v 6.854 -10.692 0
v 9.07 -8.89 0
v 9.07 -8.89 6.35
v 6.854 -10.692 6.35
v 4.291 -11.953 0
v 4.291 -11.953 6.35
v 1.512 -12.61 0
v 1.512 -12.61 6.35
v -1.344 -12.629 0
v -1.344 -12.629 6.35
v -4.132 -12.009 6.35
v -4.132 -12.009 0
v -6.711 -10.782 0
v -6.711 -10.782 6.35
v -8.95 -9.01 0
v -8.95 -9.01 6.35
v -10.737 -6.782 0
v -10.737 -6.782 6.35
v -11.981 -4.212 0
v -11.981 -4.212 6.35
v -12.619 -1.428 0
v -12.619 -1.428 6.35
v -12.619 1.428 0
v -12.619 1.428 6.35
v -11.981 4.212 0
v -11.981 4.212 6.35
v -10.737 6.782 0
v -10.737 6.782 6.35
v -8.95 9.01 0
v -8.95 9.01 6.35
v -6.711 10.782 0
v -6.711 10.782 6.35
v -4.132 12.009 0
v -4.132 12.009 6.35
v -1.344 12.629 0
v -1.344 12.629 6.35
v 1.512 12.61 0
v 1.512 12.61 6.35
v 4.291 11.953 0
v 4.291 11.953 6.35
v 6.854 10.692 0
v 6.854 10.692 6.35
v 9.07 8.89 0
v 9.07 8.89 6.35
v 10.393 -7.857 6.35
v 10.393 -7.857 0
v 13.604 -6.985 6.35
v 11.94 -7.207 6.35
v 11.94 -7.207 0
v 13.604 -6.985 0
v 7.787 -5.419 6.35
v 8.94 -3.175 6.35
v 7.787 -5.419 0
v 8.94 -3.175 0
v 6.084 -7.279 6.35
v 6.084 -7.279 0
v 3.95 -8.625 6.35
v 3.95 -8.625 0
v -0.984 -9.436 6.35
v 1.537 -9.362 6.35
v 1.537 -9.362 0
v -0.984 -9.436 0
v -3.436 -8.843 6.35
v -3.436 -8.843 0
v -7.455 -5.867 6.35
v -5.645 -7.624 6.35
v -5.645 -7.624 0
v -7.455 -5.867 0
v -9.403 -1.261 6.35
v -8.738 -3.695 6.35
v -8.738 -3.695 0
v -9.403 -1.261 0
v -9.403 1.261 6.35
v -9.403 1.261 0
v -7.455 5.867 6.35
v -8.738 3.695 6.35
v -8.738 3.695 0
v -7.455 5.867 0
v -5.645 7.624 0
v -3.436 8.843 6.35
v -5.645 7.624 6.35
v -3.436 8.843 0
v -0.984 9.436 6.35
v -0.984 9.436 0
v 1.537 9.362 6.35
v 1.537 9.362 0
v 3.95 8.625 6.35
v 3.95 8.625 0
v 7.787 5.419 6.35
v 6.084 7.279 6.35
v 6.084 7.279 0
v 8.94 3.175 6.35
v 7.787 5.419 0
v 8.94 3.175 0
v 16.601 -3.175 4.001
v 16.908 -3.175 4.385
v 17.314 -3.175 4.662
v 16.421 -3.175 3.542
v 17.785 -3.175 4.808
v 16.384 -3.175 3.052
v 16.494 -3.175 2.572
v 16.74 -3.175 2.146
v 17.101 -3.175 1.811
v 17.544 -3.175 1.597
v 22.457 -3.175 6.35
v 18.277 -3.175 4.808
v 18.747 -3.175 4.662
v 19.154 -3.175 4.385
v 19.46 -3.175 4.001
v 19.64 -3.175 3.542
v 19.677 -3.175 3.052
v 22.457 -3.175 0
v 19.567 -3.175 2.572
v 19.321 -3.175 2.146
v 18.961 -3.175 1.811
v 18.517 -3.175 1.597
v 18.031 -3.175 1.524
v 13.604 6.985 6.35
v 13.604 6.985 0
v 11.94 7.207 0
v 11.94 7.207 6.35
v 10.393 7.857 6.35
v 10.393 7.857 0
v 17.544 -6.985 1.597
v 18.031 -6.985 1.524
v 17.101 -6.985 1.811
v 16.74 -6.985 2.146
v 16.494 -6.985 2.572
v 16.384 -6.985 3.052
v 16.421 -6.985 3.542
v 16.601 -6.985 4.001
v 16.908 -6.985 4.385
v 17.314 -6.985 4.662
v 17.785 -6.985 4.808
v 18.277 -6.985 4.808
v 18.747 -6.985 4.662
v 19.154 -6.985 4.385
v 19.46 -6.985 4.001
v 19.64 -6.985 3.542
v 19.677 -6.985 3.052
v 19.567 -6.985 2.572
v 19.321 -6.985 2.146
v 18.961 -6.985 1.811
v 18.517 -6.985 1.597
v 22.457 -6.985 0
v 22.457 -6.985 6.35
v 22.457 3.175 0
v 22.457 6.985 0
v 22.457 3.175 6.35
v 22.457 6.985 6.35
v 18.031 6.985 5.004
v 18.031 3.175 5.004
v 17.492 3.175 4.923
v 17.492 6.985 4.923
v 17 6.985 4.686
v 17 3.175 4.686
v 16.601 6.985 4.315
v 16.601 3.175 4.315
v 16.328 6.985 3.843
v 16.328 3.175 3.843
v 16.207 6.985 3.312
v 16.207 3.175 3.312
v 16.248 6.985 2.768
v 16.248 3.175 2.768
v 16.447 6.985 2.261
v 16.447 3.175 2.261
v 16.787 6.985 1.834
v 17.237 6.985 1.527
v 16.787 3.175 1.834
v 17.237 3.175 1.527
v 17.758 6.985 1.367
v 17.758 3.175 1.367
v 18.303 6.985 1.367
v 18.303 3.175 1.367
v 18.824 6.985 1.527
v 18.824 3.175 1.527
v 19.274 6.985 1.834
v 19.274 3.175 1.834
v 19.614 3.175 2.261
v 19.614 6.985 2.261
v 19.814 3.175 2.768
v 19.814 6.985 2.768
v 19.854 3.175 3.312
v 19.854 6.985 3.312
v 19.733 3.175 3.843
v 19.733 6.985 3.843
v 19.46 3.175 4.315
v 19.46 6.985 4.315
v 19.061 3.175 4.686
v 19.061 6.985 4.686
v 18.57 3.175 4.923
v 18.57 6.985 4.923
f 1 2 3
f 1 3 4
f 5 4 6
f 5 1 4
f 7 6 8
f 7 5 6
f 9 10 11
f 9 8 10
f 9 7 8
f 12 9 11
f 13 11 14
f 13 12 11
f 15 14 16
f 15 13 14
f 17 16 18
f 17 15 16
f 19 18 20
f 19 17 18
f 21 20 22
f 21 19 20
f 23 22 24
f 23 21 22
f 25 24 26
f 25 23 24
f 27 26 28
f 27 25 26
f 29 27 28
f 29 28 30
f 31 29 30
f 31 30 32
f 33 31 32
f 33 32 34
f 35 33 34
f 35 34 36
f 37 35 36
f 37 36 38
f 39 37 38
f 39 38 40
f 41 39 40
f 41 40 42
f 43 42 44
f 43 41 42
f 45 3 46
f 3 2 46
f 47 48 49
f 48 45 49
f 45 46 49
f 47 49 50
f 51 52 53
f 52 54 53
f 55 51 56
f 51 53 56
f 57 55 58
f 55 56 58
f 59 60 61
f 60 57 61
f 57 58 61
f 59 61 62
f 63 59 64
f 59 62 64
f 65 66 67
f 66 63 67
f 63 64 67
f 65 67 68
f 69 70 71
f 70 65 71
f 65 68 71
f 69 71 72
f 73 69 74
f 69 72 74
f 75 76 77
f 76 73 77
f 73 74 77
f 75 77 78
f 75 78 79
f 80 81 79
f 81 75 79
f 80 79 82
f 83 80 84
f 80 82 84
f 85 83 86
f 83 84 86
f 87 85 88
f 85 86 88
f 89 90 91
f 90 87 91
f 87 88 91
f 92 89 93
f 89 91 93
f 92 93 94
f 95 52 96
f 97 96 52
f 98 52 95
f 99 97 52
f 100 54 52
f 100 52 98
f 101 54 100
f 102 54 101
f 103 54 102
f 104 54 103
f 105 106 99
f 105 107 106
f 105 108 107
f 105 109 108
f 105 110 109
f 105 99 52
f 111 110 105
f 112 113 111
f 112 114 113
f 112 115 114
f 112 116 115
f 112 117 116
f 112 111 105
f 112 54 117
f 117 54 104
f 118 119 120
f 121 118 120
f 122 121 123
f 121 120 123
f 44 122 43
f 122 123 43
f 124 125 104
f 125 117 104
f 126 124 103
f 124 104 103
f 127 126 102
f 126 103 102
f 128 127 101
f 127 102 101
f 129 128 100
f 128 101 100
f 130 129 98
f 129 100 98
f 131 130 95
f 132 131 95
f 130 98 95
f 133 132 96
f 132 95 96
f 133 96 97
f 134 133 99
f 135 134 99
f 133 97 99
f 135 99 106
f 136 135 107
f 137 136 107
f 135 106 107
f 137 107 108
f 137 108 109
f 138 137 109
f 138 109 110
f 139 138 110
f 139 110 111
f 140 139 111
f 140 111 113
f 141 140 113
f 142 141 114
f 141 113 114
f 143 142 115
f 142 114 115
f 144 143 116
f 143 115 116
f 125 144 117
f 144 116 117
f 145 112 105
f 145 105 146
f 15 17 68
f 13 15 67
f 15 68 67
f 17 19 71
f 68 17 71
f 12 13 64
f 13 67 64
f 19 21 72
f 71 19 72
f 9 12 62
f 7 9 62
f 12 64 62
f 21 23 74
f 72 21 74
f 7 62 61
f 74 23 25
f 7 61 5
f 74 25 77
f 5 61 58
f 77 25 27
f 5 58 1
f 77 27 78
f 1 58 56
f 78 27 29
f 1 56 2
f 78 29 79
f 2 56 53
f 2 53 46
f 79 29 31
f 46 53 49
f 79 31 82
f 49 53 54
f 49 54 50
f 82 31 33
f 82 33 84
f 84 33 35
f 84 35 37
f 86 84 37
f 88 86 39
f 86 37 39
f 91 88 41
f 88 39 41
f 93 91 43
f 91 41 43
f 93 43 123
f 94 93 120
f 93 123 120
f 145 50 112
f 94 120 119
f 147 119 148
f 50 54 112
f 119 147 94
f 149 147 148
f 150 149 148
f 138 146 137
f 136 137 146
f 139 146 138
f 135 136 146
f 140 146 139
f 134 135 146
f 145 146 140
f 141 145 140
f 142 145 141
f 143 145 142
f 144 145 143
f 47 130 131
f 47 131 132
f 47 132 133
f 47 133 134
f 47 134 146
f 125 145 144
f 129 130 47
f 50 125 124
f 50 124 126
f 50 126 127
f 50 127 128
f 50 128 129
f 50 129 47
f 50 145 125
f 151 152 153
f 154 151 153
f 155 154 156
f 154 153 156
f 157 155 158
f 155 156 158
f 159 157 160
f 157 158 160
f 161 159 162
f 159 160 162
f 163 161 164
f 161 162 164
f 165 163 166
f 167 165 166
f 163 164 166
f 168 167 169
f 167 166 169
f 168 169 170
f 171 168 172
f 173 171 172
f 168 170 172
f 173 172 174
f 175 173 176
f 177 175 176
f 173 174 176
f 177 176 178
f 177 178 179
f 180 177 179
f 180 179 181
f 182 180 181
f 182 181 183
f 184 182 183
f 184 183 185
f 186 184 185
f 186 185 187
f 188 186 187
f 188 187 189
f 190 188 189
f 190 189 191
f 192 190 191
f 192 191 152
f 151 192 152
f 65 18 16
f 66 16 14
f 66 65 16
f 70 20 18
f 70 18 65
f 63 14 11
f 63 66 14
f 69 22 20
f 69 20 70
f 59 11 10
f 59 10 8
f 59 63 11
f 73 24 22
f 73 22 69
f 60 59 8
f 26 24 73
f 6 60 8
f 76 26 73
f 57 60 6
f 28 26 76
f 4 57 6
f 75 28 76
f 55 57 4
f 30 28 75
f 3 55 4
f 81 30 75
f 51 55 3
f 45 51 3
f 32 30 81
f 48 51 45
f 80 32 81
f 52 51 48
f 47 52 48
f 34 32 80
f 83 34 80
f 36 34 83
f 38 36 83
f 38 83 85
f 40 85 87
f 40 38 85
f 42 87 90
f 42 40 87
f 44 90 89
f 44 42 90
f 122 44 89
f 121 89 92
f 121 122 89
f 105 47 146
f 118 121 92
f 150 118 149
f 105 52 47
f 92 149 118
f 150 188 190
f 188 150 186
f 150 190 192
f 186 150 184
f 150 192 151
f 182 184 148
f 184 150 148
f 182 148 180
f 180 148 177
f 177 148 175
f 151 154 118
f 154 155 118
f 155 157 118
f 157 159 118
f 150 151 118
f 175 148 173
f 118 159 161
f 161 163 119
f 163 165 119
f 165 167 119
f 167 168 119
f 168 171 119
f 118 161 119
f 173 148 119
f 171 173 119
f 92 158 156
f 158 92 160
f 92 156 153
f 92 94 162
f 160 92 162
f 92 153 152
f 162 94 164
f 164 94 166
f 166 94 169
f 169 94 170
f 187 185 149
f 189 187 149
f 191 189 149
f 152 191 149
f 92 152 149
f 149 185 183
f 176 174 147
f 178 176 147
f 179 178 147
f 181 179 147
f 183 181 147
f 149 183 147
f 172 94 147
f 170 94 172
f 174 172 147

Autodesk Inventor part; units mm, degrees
ref_plane "YZ Plane" through (0, 0, 0) normal (1, 0, 0) x (0, 1, 0)
ref_plane "XZ Plane" through (0, 0, 0) normal (0, 1, 0) x (-1, 0, 0)
ref_plane "XY Plane" through (0, 0, 0) normal (0, 0, 1) x (1, 0, 0)
sketch "Sketch1" plane through (0, 0, 0) normal (0, 0, 1) x (1, 0, 0)
  arc A0 (8.9398, 3.175) -> (8.9398, -3.175) centre (0, 0) ccw
  arc A1 (9.0696, 8.89) -> (9.0696, -8.89) centre (0, 0) ccw
  line L0 (8.9398, 3.175) -> (12.2967, 3.175)
  line L1 (8.9398, -3.175) -> (12.2967, -3.175)
  line L2 (12.2967, 3.175) -> (22.4567, 3.175)
  line L3 (12.2967, -3.175) -> (22.4567, -3.175)
  line L4 (22.4567, 3.175) -> (22.4567, 6.985)
  line L5 (22.4567, 6.985) -> (13.6044, 6.985)
  line L6 (22.4567, -3.175) -> (22.4567, -6.985)
  line L7 (22.4567, -6.985) -> (13.6044, -6.985)
  line L8 (-18.034, 0) -> (28.275, 0) construction
  arc A2 (9.0696, 8.89) -> (13.6044, 6.985) centre (13.6044, 13.335) ccw
  arc A3 (13.6044, -6.985) -> (9.0696, -8.89) centre (13.6044, -13.335) ccw
  point P0 (10.6066, 6.985)
  point P1 (10.6066, -6.985)
  dimension "d0" = 18.9738
  dimension "d1" = 25.4
  dimension "d8" = 3.81
  dimension "d18" = 3.175
  dimension "d19" = 6.35
  dimension "d20" = 13.5169
  dimension "d21" = 8.8523
extrude "Extrusion1" add sketch "Sketch1" along normal blind 6.35
sketch "Sketch2" plane through (13.6044, 6.985, 0) normal (0, 1, 0) x (1, 0, 0)
  line L0 (0, 0) -> (8.8523, 0) projected
  line L1 (8.8523, -6.35) -> (0, -6.35) projected
  line L2 (4.4262, -6.35) -> (4.4262, 0) construction
  point P0 (-13.6044, 0)
  point P1 (4.4262, -3.175)
hole "Hole1" at (18.0306, 6.985, 3.175) direction (0, -1, 0) diameter 3.6576 end up to surface clearance for "Flat Head Machine Screw (82)" size "#6" standard "Ansi Unified Screw Threads"
sketch "Sketch3" plane through (13.6044, -6.985, 0) normal (0, -1, 0) x (1, 0, 0)
  circle A0 centre (4.4262, 3.175) radius 1.8288 projected
  point P0 (-13.6044, 0)
hole "Hole2" at (18.0306, -6.985, 3.175) direction (0, 1, 0) diameter 3.302 end up to surface thread size "8-32 UNC" class "2B" standard "ANSI Unified Screw Threads"
properties part number "bearing_blcok"
